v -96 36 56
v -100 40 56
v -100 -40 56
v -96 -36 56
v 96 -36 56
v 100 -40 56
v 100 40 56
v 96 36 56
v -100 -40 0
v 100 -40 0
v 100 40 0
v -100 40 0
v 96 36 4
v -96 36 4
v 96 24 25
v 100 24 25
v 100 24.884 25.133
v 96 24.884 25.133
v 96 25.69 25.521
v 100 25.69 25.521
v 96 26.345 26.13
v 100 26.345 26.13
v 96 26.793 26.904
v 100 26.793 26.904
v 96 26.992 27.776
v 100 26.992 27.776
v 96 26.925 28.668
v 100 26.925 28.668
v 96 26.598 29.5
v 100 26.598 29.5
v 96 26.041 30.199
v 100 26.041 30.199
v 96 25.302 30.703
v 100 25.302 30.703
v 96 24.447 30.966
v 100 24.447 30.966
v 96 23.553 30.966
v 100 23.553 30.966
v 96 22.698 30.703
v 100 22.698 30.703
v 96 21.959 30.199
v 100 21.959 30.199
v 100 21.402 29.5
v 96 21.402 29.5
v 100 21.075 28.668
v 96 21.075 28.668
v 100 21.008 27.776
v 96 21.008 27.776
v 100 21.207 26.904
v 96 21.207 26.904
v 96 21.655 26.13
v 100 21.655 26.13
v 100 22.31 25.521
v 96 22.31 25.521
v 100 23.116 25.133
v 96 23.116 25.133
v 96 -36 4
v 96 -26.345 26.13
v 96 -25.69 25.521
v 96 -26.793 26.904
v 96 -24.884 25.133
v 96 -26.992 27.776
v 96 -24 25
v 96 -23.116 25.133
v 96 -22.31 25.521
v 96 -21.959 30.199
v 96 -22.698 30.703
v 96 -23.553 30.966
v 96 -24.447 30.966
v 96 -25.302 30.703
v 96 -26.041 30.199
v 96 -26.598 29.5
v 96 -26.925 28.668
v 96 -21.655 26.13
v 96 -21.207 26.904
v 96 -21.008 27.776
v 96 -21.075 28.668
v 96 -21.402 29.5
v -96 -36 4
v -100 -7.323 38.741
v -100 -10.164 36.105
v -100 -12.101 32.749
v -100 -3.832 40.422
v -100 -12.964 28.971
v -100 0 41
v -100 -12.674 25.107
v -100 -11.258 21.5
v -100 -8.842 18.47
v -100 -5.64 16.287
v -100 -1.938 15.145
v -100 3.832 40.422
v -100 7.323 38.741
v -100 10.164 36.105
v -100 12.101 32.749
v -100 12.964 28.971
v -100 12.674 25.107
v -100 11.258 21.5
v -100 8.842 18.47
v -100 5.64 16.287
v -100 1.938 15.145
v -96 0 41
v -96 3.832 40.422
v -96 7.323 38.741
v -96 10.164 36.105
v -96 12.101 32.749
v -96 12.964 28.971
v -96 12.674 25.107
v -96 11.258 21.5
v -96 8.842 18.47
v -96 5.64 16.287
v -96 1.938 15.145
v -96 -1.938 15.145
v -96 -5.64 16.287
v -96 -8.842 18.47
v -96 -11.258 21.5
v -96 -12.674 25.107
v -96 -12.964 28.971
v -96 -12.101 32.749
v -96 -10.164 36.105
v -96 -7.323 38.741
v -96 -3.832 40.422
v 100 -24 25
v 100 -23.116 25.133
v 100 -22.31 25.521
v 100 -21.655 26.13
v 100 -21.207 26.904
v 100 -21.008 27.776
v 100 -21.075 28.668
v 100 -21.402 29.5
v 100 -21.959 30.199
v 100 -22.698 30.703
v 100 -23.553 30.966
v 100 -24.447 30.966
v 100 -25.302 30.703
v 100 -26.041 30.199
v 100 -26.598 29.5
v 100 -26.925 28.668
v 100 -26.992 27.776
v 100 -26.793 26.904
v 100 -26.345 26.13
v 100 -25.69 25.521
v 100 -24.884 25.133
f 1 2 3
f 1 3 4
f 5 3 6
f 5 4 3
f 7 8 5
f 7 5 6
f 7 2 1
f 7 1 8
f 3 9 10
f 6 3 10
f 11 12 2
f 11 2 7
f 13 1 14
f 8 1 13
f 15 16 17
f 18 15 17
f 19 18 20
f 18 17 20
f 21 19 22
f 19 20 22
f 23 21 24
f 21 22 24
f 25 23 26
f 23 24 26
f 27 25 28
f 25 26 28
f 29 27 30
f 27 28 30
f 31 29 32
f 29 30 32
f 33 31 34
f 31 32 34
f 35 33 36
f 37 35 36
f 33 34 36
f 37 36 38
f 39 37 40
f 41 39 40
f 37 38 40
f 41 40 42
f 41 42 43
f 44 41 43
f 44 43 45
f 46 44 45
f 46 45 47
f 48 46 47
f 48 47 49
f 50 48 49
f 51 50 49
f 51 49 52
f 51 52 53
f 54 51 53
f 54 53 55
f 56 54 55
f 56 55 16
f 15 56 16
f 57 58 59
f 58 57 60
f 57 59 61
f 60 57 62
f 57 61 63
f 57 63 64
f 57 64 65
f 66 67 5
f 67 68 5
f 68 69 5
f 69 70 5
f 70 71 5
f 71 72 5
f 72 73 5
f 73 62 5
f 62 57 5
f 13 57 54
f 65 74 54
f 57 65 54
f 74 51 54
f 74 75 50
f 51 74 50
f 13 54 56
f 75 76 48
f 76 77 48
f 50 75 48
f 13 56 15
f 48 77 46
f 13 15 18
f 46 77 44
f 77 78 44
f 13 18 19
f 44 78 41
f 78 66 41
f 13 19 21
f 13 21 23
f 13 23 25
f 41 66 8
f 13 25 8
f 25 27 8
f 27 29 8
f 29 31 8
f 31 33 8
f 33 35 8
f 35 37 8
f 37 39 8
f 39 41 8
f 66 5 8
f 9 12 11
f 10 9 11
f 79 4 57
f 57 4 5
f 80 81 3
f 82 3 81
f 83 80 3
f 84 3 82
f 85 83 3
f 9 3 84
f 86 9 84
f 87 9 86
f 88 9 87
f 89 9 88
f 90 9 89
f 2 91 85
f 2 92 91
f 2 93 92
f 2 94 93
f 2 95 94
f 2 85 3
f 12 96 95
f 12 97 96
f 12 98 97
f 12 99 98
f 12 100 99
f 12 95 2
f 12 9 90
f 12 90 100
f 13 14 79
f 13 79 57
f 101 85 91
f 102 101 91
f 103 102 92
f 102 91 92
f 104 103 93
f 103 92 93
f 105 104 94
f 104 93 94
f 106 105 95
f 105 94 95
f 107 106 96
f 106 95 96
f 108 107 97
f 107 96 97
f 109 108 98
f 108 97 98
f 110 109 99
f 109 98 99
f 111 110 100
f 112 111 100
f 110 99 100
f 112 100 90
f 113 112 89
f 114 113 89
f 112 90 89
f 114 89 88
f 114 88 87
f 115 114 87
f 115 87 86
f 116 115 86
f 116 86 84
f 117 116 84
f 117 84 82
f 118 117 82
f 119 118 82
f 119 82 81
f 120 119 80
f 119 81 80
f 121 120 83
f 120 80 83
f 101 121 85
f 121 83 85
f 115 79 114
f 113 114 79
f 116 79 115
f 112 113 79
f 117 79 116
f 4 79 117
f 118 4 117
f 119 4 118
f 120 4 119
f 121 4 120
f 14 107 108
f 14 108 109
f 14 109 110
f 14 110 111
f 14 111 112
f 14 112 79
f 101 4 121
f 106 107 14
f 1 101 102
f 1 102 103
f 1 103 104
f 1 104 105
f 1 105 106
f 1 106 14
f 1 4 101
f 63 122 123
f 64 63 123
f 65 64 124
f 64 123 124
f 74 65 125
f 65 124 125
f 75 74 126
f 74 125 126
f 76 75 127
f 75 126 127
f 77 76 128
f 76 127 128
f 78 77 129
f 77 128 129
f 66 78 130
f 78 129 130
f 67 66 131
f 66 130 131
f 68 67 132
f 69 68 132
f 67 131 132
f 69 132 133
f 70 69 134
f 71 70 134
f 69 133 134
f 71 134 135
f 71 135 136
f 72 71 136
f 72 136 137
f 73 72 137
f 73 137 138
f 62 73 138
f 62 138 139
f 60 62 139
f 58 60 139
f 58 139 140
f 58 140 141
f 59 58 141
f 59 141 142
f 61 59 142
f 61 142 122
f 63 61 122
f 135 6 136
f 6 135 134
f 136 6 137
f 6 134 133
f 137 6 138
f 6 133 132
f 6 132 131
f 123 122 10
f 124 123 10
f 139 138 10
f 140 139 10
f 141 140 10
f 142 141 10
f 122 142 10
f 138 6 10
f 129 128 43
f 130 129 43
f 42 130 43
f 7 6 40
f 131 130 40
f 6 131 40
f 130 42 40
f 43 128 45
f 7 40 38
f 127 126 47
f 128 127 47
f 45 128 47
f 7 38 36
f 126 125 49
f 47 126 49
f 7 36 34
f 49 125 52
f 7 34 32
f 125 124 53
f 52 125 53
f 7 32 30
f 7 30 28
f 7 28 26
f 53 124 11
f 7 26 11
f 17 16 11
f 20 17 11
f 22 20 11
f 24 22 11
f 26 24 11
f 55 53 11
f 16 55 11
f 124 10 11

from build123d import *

# Parameters (mm, degrees)
SKETCH_2_W          = 200
SKETCH_2_H          = 80
EXTRUDE_1_DEPTH     = 56
SKETCH_3_W          = 192
SKETCH_3_H          = 72
CUT_EXTRUDE_1_DEPTH = 52
SKETCH_6_R          = 13
CUT_EXTRUDE_2_DEPTH = 4
SKETCH_8_R          = 3
CUT_EXTRUDE_3_DEPTH = 10


with BuildPart() as part:
    # 草图2 → 凸台-拉伸1 (new body)
    with BuildSketch(Plane.XY):
        Rectangle(SKETCH_2_W, SKETCH_2_H)
    extrude(amount=EXTRUDE_1_DEPTH)

    # 草图3 → 切除-拉伸1 (cut)
    with BuildSketch(Plane.XY.offset(56)):
        Rectangle(SKETCH_3_W, SKETCH_3_H)
    extrude(amount=-CUT_EXTRUDE_1_DEPTH, mode=Mode.SUBTRACT)

    # 草图6 → 切除-拉伸2 (cut)
    with BuildSketch(Plane.ZY.offset(100)):
        with Locations((28, 0)):
            Circle(SKETCH_6_R)
    extrude(amount=-CUT_EXTRUDE_2_DEPTH, mode=Mode.SUBTRACT)

    # 草图8 → 切除-拉伸3 (cut)
    with BuildSketch(Plane(origin=(100, 0, 0), x_dir=(0, 0, -1), z_dir=(1, 0, 0))):
        with Locations((-28, 24)):
            Circle(SKETCH_8_R)
        with Locations((-28, -24)):
            Circle(SKETCH_8_R)
    extrude(amount=-CUT_EXTRUDE_3_DEPTH, mode=Mode.SUBTRACT)


solid = part.part
